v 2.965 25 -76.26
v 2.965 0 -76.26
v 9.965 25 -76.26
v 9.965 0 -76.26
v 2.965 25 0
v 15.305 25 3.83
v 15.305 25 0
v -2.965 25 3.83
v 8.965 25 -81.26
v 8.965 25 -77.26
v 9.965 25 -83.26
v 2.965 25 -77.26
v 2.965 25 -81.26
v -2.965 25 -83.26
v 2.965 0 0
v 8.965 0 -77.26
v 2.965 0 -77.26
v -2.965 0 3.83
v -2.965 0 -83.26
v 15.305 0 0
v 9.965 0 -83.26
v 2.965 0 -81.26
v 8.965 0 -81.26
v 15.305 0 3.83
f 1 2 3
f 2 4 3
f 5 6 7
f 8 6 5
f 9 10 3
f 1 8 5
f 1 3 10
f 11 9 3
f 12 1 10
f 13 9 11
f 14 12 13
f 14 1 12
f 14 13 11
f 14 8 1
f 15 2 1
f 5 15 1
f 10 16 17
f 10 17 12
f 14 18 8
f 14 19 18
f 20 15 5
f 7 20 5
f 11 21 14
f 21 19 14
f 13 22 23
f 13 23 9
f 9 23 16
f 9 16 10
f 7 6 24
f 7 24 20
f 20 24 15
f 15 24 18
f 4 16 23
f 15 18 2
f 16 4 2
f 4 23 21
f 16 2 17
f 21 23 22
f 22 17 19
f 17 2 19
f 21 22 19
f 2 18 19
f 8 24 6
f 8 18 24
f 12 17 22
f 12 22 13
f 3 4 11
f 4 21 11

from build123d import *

# Parameters (mm, degrees)
SCHIZZO2_W                   = 5.93
SCHIZZO2_H                   = 25
ESTRUSIONE_ESTRUSIONE1_DEPTH = 83.26
SCHIZZO3_W                   = 2
SCHIZZO3_H                   = 25
ESTRUSIONE_ESTRUSIONE2_DEPTH = 7
SCHIZZO4_W                   = 1
SCHIZZO4_H                   = 25
ESTRUSIONE_ESTRUSIONE3_DEPTH = 5
SCHIZZO5_W                   = 1
SCHIZZO5_H                   = 25
ESTRUSIONE_ESTRUSIONE4_DEPTH = 6
SCHIZZO7_W                   = 5.93
SCHIZZO7_H                   = 25
ESTRUSIONE_ESTRUSIONE5_DEPTH = 3.83
SCHIZZO9_W                   = 3.83
SCHIZZO9_H                   = 25
ESTRUSIONE_ESTRUSIONE7_DEPTH = 12.34


with BuildPart() as part:
    # Schizzo2 → Estrusione-Estrusione1 (new body)
    with BuildSketch(Plane.XY):
        with Locations((0, 12.5)):
            Rectangle(SCHIZZO2_W, SCHIZZO2_H)
    extrude(amount=-ESTRUSIONE_ESTRUSIONE1_DEPTH)

    # Schizzo3 → Estrusione-Estrusione2 (add)
    with BuildSketch(Plane(origin=(2.965, 0, 0), x_dir=(0, 0, -1), z_dir=(1, 0, 0))):
        with Locations((82.26, 12.5)):
            Rectangle(SCHIZZO3_W, SCHIZZO3_H)
    extrude(amount=ESTRUSIONE_ESTRUSIONE2_DEPTH)

    # Schizzo4 → Estrusione-Estrusione3 (add)
    with BuildSketch(Plane.XY.offset(-81.26)):
        with Locations((9.465, 12.5)):
            Rectangle(SCHIZZO4_W, SCHIZZO4_H)
    extrude(amount=ESTRUSIONE_ESTRUSIONE3_DEPTH)

    # Schizzo5 → Estrusione-Estrusione4 (add)
    with BuildSketch(Plane.ZY.offset(-8.965)):
        with Locations((-76.76, 12.5)):
            Rectangle(SCHIZZO5_W, SCHIZZO5_H)
    extrude(amount=ESTRUSIONE_ESTRUSIONE4_DEPTH)

    # Schizzo7 → Estrusione-Estrusione5 (add)
    with BuildSketch(Plane.XY):
        with Locations((0, 12.5)):
            Rectangle(SCHIZZO7_W, SCHIZZO7_H)
    extrude(amount=ESTRUSIONE_ESTRUSIONE5_DEPTH)

    # Schizzo9 → Estrusione-Estrusione7 (add)
    with BuildSketch(Plane(origin=(2.965, 0, 0), x_dir=(0, 0, -1), z_dir=(1, 0, 0))):
        with Locations((-1.915, 12.5)):
            Rectangle(SCHIZZO9_W, SCHIZZO9_H)
    extrude(amount=ESTRUSIONE_ESTRUSIONE7_DEPTH)


solid = part.part
